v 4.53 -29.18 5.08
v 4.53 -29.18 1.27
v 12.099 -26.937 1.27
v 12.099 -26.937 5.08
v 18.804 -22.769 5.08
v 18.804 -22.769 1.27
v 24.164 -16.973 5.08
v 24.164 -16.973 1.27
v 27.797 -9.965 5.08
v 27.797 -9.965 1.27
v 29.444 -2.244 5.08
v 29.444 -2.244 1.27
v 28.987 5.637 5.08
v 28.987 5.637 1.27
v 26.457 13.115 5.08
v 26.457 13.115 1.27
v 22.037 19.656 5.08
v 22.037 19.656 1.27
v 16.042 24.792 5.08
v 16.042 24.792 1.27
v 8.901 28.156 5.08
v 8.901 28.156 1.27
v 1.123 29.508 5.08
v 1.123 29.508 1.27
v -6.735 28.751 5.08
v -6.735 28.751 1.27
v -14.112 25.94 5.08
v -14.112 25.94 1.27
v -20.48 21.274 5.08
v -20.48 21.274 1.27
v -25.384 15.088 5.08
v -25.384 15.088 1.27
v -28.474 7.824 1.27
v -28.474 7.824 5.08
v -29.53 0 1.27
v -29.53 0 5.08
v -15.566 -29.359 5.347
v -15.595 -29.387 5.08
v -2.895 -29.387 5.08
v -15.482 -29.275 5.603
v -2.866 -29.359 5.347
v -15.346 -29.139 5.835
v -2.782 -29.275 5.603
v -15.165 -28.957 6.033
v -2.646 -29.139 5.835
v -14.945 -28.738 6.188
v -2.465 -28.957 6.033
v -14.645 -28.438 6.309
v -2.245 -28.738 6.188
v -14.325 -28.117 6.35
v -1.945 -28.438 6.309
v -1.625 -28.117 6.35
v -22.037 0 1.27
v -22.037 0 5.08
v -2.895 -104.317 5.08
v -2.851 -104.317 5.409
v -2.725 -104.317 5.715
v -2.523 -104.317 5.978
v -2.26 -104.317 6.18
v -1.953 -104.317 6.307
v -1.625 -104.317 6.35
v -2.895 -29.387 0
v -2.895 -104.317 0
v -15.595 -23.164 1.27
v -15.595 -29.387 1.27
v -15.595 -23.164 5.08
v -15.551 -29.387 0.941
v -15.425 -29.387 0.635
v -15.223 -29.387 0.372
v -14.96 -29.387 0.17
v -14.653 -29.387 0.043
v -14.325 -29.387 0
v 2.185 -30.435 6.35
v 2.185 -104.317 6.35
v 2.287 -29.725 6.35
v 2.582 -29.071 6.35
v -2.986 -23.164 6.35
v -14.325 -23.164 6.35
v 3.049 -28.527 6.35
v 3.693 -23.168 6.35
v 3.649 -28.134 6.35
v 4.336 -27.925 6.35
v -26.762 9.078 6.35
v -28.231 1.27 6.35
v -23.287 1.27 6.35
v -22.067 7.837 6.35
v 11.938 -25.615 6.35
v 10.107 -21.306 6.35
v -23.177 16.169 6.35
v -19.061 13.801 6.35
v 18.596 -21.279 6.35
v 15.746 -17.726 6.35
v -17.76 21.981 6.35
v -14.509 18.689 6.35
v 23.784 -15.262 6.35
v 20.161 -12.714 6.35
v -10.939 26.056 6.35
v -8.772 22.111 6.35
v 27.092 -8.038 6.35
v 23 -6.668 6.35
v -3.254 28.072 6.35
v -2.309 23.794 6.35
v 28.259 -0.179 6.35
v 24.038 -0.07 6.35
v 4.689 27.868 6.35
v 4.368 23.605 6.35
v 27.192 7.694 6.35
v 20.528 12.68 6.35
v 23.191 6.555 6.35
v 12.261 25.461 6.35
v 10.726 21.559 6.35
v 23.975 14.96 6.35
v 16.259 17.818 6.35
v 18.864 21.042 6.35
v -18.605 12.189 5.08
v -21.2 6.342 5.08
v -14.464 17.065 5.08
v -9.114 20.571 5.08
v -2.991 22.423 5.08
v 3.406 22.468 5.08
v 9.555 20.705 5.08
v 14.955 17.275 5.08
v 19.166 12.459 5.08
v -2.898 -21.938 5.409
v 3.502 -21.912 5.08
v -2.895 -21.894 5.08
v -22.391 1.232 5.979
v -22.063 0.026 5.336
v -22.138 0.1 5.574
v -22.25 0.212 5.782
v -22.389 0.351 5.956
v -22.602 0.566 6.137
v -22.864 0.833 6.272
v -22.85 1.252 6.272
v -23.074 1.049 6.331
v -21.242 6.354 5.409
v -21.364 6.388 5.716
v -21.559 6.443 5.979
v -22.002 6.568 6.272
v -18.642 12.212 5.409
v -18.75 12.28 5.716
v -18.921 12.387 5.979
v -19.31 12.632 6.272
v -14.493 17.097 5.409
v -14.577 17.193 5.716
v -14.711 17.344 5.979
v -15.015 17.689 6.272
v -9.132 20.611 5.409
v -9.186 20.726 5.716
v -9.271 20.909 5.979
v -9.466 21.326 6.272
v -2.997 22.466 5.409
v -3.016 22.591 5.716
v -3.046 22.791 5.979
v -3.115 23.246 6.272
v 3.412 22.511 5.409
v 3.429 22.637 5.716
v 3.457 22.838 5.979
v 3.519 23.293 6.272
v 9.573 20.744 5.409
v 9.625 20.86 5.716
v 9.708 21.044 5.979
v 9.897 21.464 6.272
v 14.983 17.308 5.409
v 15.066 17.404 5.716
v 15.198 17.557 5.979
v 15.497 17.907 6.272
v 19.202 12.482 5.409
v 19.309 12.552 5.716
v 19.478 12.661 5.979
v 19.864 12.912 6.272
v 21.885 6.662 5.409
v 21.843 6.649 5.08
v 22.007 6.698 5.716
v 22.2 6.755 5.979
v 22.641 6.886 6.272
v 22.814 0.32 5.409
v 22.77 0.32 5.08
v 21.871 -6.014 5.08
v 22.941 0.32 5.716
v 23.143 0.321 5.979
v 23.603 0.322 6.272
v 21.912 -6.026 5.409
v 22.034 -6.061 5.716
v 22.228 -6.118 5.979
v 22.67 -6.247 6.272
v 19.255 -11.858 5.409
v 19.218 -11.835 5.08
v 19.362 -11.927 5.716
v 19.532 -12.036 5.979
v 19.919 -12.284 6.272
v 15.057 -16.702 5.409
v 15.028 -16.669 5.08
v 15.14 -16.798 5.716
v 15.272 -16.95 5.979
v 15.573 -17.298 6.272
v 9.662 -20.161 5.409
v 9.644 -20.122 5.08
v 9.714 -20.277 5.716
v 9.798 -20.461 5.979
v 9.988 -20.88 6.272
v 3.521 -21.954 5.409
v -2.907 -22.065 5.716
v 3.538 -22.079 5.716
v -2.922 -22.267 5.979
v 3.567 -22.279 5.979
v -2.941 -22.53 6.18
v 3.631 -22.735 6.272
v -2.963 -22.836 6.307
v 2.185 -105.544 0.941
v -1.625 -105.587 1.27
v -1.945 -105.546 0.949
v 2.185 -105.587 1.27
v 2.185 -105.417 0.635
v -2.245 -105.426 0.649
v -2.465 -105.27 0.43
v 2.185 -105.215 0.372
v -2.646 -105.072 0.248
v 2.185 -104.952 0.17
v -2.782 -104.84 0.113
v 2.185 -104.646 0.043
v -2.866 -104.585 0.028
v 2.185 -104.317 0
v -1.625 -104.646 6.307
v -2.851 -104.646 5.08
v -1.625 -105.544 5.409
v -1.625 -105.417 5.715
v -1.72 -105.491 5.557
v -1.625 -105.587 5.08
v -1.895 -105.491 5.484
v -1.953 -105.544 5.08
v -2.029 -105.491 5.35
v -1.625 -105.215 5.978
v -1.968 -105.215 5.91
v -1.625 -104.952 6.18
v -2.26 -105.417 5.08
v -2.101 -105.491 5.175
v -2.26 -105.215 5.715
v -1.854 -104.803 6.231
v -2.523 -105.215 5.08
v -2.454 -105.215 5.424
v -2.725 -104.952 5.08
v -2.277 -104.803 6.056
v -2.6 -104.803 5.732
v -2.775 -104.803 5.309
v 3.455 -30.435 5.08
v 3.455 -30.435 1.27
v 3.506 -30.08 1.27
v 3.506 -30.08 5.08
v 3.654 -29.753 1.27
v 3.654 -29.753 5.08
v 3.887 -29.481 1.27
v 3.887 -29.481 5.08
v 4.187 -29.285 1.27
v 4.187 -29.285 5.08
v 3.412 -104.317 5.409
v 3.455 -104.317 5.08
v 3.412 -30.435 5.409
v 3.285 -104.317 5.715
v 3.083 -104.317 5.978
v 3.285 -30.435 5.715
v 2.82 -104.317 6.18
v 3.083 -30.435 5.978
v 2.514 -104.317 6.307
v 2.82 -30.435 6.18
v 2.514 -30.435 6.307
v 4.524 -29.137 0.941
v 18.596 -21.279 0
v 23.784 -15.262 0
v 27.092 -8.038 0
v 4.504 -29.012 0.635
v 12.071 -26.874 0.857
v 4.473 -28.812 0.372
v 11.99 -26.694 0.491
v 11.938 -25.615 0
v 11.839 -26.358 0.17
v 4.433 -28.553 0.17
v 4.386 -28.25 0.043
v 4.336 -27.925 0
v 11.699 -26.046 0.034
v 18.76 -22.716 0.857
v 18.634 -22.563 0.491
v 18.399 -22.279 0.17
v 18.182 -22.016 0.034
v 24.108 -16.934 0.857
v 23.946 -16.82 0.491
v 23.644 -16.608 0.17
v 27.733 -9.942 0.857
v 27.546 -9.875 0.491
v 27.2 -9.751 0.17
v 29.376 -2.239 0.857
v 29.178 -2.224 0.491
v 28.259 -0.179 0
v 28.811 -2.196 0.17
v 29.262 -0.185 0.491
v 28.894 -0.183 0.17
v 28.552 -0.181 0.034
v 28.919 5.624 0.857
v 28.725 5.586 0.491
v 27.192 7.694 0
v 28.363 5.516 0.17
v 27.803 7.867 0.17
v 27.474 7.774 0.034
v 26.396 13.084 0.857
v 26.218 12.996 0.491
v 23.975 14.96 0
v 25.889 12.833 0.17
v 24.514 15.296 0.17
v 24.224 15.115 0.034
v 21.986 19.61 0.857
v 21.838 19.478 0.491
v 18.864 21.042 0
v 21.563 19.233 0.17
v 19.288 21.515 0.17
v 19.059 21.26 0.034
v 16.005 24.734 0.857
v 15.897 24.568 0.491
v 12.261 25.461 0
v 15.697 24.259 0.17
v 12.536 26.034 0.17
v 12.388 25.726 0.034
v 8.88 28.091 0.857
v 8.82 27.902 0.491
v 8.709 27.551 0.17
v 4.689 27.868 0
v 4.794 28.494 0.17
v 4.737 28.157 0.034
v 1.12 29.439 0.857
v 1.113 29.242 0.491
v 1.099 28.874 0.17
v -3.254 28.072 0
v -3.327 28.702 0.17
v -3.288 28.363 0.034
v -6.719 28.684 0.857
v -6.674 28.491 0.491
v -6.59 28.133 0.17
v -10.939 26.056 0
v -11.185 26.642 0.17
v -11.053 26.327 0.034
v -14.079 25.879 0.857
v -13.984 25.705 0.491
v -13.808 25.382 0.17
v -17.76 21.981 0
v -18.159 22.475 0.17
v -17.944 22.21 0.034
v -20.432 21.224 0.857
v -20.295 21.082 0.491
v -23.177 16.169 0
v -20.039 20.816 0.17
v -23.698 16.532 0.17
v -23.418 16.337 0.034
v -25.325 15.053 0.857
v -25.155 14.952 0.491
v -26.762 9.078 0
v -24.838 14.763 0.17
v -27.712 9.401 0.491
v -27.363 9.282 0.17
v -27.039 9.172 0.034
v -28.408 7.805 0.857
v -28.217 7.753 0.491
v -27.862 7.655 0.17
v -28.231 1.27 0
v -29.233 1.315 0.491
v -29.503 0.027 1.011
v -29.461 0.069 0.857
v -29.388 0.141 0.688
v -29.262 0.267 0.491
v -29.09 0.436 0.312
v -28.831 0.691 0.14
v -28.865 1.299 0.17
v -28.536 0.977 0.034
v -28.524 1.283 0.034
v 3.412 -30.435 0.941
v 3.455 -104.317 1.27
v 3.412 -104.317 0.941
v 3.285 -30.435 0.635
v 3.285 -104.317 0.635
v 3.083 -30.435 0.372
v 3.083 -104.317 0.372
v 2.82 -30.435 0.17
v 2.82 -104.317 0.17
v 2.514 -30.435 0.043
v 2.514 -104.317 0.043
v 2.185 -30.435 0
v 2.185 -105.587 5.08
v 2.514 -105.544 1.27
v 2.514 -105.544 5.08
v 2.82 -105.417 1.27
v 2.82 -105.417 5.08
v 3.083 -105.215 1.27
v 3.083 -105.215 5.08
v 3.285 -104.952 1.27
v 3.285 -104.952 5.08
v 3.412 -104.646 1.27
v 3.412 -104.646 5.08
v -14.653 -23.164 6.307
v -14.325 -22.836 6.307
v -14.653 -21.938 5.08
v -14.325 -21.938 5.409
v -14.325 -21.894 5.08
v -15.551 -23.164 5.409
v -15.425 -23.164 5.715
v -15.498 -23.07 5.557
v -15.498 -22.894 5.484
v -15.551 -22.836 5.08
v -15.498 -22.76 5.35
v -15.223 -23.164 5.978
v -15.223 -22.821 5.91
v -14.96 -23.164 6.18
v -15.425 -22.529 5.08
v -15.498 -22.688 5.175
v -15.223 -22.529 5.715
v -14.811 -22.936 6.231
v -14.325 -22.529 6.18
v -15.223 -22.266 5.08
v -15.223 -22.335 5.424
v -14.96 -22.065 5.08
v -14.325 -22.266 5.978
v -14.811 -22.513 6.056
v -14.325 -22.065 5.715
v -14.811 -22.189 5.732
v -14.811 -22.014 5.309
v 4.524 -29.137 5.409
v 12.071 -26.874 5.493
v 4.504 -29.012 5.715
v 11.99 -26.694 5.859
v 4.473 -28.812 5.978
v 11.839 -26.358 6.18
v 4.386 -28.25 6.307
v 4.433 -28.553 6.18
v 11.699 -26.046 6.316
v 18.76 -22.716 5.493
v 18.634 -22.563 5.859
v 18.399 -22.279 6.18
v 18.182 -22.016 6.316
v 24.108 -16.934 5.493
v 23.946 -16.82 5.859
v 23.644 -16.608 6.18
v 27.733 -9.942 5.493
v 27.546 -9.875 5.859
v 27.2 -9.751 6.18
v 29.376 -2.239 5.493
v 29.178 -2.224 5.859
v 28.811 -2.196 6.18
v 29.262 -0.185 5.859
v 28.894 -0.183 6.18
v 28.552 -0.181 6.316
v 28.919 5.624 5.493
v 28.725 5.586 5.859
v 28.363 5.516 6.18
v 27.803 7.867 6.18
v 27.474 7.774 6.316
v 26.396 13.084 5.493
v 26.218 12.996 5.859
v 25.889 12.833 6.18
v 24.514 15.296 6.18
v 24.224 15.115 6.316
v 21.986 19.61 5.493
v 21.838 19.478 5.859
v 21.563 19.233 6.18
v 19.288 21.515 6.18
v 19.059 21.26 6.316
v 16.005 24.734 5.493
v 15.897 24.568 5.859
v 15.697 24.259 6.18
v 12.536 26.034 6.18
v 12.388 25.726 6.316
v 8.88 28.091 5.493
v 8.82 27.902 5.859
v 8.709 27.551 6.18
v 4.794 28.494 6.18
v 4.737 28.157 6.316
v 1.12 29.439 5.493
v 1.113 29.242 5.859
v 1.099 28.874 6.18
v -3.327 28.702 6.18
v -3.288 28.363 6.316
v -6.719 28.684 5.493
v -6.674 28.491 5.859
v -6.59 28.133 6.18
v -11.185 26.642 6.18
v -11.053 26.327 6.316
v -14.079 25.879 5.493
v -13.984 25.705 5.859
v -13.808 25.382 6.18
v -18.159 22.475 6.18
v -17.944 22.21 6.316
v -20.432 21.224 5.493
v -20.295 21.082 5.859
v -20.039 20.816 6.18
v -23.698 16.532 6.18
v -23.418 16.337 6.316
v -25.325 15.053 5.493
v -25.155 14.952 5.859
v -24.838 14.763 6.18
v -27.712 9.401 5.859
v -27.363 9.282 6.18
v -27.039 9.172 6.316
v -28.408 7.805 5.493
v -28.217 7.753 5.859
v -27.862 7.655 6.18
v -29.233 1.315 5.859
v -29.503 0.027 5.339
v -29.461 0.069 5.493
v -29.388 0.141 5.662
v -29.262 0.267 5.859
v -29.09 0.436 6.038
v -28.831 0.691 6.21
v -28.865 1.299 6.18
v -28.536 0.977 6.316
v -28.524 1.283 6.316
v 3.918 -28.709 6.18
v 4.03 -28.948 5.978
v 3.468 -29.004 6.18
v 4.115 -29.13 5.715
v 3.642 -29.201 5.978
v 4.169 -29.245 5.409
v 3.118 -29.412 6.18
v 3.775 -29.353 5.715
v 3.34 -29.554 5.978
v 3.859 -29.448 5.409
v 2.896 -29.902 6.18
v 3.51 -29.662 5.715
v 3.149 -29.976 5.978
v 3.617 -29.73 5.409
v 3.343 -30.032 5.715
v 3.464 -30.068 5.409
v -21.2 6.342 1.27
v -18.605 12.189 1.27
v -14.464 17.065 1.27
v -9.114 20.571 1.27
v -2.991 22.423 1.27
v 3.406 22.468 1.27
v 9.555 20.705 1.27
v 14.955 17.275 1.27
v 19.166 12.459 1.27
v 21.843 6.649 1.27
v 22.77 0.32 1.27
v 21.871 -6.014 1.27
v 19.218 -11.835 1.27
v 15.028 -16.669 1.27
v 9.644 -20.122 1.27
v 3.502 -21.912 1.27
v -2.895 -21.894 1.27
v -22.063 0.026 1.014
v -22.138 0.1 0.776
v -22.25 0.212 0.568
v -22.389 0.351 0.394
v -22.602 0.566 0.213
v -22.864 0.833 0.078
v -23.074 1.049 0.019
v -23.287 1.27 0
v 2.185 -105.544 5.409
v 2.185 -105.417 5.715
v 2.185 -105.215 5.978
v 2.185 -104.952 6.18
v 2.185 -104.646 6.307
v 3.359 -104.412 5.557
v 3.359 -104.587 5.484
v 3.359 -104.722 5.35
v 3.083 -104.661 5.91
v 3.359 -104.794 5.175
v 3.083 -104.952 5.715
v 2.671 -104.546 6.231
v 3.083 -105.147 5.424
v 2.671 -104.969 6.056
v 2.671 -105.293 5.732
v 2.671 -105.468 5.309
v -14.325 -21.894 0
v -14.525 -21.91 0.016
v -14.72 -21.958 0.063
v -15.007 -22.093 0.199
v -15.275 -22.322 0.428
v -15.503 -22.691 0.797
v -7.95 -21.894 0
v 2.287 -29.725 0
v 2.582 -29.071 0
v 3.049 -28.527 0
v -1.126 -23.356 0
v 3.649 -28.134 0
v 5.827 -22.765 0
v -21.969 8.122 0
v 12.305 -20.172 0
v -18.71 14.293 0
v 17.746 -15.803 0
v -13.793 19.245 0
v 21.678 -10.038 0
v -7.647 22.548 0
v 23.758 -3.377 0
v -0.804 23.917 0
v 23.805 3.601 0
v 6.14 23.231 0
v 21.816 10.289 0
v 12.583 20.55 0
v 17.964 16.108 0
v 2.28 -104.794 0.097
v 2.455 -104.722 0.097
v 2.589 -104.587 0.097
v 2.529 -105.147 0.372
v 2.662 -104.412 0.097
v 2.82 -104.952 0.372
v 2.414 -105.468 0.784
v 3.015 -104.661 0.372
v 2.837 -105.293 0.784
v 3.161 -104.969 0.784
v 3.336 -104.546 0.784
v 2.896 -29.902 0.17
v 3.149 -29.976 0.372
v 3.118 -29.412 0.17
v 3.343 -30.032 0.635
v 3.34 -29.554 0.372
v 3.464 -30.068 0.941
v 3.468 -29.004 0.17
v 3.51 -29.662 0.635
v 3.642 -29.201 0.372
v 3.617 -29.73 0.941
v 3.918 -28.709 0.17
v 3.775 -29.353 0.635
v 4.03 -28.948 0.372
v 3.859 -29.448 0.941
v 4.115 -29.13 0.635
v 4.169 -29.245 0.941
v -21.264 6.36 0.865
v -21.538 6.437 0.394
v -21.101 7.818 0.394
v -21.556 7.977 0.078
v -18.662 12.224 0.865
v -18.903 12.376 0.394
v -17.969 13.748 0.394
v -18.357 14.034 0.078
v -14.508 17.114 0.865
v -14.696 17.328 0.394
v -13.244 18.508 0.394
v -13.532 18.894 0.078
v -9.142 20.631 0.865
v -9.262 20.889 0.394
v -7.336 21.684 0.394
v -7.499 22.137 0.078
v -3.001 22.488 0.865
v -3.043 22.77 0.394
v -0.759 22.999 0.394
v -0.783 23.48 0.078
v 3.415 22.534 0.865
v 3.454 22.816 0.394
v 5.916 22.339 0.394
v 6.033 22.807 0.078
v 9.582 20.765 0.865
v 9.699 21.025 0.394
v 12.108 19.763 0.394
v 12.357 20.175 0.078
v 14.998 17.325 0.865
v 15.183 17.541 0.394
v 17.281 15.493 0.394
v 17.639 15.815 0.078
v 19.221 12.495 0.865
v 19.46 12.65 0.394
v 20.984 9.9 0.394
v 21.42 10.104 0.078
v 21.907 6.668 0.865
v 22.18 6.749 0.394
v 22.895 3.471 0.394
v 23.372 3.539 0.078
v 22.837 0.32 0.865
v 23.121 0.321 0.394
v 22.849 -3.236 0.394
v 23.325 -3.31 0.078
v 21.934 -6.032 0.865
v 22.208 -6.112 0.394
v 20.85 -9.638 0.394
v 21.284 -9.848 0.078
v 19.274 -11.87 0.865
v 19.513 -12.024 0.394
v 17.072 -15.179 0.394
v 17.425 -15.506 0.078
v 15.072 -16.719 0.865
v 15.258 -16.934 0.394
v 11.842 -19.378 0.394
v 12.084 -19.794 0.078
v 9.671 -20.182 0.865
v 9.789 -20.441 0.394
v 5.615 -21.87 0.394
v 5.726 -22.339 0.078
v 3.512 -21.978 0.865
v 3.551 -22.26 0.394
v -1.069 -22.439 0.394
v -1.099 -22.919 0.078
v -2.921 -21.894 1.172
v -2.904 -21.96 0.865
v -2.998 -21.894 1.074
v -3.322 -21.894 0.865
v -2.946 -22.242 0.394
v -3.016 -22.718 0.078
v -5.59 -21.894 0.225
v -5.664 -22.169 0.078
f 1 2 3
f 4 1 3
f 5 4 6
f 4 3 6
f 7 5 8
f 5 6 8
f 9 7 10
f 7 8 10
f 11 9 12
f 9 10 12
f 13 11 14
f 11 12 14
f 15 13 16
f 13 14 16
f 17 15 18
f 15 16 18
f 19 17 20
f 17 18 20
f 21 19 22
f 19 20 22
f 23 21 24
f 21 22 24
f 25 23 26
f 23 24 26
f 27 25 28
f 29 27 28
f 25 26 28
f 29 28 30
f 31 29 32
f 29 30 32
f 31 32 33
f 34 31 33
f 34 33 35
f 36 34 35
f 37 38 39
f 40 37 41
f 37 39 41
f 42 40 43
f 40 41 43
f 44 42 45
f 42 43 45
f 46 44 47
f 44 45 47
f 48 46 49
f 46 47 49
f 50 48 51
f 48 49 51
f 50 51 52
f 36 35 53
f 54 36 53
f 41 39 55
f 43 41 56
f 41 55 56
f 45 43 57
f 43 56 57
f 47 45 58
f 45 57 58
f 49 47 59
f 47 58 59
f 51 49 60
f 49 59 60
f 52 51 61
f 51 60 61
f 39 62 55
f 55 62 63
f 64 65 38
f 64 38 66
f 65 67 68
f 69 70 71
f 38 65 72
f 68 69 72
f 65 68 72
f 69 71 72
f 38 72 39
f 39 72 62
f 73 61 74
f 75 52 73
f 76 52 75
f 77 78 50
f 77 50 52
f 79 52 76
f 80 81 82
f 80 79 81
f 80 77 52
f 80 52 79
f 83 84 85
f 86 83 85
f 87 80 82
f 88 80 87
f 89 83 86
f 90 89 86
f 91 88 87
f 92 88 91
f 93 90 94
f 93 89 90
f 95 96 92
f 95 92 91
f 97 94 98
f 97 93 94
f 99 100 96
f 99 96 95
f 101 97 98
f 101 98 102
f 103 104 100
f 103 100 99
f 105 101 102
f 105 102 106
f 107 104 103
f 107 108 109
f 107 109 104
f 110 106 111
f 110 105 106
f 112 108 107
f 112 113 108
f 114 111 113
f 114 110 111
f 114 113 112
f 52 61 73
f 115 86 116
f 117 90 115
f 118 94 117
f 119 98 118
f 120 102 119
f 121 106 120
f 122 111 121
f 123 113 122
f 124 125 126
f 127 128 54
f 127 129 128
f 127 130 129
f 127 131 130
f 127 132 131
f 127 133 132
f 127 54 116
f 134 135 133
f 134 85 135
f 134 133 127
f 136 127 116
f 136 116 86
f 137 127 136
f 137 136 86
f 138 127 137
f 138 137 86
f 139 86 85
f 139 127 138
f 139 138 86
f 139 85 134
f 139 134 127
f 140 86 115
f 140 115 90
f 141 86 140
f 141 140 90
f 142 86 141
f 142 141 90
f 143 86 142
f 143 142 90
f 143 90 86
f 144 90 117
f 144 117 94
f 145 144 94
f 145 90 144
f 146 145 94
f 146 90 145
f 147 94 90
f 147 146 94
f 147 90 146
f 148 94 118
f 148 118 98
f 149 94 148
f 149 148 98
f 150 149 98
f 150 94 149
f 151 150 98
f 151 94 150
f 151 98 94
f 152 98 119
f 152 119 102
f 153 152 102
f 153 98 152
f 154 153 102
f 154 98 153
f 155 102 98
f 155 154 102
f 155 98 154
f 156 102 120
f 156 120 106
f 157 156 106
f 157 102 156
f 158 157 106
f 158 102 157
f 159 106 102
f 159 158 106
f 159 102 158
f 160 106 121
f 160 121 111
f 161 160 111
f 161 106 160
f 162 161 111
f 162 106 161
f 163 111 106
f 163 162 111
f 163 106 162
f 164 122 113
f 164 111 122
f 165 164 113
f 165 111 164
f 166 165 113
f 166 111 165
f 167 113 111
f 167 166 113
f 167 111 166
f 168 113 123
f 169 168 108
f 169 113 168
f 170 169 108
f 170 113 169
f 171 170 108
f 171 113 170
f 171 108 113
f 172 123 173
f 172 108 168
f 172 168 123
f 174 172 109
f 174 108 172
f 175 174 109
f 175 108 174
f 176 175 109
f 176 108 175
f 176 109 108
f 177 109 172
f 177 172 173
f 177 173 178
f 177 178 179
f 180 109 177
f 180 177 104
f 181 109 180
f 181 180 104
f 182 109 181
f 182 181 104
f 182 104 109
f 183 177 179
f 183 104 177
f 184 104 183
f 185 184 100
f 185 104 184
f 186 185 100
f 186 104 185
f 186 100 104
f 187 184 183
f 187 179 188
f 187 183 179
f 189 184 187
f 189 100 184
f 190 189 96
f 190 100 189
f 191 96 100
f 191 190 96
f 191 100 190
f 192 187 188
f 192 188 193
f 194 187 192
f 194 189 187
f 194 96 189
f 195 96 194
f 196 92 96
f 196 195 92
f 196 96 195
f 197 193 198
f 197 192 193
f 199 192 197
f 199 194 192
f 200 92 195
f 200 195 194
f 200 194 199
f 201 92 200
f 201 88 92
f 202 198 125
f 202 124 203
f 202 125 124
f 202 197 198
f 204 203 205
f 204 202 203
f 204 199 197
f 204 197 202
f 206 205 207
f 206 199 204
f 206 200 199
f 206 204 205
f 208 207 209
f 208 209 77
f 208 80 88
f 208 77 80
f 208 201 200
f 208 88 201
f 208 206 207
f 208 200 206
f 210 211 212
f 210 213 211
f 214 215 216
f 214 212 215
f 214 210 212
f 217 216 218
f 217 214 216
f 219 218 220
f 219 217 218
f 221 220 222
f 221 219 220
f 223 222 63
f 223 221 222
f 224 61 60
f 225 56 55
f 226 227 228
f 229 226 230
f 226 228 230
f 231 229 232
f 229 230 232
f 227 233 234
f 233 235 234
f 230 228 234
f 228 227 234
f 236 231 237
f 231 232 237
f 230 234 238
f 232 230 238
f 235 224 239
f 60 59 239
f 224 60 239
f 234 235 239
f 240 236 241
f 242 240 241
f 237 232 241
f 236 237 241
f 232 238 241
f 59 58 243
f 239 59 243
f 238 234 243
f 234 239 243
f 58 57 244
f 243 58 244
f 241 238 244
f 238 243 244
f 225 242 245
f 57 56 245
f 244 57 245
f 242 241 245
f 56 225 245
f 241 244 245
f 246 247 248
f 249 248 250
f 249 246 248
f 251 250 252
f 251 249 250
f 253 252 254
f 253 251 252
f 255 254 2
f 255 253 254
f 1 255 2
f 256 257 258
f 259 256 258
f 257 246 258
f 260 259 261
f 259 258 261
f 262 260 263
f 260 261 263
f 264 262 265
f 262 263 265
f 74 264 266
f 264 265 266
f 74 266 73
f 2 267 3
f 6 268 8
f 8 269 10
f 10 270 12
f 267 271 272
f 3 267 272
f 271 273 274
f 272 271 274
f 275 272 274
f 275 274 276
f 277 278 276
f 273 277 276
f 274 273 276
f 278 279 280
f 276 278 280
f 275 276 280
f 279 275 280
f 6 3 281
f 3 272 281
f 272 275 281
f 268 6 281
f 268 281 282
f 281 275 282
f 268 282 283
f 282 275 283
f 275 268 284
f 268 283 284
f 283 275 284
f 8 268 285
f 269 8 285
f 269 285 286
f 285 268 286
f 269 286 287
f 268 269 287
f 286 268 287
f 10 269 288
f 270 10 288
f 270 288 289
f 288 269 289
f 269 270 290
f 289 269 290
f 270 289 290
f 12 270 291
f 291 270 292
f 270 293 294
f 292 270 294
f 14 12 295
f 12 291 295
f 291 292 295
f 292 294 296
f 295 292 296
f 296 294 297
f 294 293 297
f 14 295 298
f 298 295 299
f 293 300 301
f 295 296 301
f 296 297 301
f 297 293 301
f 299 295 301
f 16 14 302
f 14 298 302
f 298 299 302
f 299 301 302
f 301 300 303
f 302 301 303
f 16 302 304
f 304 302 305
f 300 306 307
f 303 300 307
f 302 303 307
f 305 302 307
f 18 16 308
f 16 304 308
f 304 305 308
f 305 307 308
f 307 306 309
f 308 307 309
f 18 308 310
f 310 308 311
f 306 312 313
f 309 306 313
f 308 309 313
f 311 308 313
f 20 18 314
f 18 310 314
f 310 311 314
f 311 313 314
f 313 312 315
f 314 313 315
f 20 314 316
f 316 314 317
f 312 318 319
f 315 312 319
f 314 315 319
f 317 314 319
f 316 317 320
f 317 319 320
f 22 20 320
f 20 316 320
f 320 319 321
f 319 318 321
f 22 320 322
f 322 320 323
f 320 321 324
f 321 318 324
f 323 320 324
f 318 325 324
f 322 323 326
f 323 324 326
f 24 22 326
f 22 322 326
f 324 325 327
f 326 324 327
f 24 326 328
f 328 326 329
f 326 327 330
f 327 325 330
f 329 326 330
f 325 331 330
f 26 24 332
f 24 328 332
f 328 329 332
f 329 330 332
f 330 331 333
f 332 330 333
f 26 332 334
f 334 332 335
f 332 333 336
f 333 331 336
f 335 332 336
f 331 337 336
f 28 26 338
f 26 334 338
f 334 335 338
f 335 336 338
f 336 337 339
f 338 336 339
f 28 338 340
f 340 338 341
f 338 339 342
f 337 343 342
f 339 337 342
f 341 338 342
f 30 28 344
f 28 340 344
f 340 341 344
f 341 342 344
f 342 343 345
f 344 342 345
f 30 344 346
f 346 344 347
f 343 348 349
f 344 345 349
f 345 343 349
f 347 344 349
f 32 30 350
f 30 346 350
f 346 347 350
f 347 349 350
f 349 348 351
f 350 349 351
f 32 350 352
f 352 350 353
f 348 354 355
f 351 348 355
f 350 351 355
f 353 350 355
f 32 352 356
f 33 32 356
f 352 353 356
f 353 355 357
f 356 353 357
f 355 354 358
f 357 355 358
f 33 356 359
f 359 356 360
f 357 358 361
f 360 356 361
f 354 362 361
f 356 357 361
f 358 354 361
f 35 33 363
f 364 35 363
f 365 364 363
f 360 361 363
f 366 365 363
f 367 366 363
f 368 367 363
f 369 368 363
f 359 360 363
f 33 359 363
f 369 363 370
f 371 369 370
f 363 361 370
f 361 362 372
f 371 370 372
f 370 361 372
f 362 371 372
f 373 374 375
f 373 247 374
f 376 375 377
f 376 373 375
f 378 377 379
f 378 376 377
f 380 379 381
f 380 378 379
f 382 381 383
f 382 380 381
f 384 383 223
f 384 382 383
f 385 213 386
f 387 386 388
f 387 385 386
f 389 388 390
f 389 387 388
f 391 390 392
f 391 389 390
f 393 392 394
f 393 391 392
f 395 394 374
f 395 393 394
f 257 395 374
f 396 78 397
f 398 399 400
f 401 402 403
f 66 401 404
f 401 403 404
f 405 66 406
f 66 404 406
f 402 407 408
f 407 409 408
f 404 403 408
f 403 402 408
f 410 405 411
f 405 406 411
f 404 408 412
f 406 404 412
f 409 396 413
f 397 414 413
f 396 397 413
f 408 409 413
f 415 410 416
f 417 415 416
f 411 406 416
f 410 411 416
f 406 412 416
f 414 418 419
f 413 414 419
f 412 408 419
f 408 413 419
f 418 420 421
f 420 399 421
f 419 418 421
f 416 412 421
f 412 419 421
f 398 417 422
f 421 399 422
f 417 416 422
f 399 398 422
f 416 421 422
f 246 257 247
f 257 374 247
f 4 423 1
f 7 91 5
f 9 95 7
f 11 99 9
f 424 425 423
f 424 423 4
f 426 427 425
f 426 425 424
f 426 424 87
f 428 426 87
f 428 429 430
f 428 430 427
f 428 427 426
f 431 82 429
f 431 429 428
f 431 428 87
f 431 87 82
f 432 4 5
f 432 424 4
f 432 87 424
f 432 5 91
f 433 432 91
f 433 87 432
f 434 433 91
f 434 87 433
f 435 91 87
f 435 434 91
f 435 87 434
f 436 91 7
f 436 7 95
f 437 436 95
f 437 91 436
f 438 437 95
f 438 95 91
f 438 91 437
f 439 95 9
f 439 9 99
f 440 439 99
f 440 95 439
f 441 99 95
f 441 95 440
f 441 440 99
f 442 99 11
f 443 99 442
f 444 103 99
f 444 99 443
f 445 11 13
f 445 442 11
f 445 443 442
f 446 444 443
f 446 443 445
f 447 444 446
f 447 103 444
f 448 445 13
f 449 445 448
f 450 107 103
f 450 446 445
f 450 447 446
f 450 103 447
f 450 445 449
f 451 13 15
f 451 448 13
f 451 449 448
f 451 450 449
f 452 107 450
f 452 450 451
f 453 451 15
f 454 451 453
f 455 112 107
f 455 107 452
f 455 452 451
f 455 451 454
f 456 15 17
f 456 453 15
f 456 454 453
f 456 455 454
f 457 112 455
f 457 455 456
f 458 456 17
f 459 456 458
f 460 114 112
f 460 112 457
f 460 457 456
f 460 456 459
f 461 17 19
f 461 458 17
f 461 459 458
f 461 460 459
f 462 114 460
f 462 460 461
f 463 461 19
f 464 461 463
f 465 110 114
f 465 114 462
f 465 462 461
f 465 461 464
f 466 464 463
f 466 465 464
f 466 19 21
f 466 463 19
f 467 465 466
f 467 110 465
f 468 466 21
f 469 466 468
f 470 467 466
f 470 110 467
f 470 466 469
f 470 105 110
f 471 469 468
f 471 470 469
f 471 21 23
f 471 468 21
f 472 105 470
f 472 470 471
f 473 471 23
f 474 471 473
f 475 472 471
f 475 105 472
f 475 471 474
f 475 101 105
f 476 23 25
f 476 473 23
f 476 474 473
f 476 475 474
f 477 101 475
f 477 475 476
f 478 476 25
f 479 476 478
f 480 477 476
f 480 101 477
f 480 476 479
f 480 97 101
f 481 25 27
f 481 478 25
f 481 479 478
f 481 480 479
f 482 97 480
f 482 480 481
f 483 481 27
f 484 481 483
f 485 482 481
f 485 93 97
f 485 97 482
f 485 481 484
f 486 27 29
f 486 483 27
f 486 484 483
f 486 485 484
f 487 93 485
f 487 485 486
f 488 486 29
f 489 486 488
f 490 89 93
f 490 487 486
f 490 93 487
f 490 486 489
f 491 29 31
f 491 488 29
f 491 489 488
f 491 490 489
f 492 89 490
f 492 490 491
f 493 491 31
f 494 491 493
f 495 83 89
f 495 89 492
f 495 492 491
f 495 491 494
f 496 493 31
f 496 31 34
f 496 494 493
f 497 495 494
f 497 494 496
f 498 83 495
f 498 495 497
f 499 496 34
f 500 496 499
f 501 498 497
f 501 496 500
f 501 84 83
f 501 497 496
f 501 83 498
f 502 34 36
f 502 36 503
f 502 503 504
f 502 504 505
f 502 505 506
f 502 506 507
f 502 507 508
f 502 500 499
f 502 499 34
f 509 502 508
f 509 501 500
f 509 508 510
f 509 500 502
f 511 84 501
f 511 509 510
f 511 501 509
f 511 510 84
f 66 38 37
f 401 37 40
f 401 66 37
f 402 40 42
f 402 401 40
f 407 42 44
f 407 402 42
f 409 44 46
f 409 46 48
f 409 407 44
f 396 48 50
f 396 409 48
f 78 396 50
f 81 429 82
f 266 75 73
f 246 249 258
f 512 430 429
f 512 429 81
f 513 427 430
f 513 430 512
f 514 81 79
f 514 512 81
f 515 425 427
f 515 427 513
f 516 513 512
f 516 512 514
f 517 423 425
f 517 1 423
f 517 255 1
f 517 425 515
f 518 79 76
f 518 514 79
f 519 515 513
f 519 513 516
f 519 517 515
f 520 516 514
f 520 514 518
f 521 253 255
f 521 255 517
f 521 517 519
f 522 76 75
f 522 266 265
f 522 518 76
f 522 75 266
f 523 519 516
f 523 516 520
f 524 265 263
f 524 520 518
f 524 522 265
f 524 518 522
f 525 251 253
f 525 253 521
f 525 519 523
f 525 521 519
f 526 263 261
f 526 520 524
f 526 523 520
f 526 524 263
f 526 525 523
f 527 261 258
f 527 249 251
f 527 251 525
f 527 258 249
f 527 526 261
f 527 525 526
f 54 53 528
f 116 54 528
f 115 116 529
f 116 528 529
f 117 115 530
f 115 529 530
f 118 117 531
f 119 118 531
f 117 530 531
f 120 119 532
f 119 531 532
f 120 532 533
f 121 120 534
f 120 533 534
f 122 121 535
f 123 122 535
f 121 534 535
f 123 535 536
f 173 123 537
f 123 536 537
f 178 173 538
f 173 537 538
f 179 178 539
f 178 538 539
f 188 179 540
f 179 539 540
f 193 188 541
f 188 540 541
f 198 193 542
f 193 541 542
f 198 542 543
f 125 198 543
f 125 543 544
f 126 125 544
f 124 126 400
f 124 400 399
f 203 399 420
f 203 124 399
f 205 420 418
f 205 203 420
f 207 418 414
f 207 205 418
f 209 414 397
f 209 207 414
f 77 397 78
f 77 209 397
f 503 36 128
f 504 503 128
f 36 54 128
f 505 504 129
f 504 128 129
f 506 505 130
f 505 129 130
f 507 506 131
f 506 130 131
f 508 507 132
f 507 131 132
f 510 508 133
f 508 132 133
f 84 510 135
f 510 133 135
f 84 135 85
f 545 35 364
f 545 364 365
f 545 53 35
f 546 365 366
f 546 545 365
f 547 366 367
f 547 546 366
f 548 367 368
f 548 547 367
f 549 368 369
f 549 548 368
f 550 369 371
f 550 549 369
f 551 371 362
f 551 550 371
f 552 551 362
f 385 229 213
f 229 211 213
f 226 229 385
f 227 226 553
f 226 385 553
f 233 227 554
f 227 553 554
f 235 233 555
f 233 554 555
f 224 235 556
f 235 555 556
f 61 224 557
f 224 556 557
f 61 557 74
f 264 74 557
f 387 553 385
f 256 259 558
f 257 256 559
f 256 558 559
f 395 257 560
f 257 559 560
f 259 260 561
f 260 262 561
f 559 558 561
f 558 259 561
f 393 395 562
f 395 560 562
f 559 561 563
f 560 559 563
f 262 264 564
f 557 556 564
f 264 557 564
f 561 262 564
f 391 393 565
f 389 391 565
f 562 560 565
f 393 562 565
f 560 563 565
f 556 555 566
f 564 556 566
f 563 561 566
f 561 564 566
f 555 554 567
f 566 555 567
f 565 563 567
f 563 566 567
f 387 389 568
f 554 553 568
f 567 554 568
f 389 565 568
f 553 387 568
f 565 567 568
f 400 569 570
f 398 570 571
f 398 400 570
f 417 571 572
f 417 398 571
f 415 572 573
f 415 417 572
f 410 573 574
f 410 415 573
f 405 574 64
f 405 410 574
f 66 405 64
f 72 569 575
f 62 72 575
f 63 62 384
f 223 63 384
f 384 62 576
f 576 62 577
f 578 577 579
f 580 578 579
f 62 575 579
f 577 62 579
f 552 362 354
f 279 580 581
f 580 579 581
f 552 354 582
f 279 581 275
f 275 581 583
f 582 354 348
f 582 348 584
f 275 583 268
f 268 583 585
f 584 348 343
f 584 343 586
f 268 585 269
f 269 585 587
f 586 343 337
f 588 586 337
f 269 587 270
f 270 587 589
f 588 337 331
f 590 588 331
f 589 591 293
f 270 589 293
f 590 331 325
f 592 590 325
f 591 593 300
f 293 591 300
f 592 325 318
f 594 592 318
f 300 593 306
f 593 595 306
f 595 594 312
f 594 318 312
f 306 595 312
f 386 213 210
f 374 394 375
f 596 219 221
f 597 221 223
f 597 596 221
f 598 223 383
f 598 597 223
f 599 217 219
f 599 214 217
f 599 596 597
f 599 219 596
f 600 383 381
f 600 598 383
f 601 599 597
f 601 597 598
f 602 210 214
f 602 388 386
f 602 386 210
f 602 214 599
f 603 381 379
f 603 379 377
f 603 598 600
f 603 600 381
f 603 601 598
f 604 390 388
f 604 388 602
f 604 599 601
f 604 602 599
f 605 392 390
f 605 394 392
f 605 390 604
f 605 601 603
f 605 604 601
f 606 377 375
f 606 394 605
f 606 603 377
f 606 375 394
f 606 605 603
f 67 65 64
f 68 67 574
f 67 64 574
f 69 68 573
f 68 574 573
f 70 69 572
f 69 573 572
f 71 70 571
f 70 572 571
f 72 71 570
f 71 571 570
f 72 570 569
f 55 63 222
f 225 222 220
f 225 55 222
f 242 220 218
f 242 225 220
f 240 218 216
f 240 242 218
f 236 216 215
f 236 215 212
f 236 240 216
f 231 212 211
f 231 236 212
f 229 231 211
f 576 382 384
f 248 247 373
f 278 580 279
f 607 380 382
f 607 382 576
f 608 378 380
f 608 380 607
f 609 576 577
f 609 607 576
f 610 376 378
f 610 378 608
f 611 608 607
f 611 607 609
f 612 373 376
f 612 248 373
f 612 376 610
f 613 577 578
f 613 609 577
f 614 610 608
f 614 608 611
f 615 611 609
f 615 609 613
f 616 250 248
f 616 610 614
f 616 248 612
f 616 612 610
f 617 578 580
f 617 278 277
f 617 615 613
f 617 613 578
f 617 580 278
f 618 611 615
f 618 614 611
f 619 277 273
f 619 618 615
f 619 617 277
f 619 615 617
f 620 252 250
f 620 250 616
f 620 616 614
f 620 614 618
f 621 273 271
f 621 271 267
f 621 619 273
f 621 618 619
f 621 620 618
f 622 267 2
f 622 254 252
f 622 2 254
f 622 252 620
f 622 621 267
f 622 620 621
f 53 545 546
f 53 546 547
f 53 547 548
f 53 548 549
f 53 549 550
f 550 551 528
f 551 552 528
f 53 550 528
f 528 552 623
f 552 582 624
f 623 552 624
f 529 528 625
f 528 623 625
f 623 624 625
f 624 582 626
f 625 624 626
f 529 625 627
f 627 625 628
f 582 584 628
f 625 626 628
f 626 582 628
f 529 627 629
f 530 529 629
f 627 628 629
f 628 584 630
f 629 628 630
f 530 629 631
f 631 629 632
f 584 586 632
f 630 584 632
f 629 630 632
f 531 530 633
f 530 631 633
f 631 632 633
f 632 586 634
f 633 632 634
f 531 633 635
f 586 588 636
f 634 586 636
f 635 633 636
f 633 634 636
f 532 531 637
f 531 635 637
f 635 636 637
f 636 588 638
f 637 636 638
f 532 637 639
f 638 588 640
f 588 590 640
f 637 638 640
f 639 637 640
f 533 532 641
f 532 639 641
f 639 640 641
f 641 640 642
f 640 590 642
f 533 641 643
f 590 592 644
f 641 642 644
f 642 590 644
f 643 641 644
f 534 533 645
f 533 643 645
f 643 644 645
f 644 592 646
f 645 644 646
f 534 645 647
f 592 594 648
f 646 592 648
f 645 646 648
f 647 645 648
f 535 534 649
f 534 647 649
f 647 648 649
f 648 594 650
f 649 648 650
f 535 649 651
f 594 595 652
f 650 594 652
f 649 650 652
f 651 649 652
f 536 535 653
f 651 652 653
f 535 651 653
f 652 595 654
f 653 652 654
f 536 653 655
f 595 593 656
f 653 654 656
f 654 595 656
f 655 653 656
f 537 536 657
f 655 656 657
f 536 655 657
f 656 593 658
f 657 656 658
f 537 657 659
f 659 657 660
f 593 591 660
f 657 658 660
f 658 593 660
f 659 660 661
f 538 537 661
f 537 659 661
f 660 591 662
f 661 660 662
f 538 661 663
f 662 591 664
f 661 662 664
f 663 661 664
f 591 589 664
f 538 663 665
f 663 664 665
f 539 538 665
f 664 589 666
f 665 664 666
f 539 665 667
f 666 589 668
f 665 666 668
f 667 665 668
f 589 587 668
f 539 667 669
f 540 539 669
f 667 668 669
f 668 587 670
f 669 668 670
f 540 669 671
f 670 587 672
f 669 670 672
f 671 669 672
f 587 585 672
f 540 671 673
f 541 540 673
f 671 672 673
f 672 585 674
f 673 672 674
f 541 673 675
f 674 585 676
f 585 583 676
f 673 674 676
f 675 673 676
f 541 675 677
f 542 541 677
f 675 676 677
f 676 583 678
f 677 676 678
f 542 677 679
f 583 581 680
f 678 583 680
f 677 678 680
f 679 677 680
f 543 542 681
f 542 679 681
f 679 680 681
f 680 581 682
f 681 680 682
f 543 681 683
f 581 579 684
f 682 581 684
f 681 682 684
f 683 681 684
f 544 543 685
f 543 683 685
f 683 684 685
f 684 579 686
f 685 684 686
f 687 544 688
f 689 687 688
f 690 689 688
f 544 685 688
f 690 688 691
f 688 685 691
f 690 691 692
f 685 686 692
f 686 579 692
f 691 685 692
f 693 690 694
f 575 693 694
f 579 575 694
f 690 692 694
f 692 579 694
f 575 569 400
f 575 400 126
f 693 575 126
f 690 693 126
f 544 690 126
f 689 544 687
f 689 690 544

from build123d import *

# Parameters (mm, degrees)
F0_W     = 12.7
F0_H     = 7.493
F1_DEPTH = 6.35
F2_R     = 1.27


# Not quite as in the source:
# - two fillets or chamfers of one size are made in one step
# - a feature names something its author has since deleted; it is built from what else it names


with BuildPart() as f1:
    # F0 (on Top) → F1 (new body)
    with BuildSketch(Plane.XY):
        with BuildLine():
            Line((-2.8947171572, -21.8944355268), (-2.8947171572, -29.3874355268))
            ThreePointArc((-2.8947171572, -29.3874355268), (0.2819172587, -29.5283131405), (3.4552828428, -29.3268098289))
            ThreePointArc((3.4552828428, -29.3268098289), (19.6210018926, 22.0684625426), (-29.5296588918, 0))
            Line((-29.5296588918, 0), (-22.0366588918, 0))
            ThreePointArc((-22.0366588918, 0), (17.2330212266, 15.017871009), (-2.8947171572, -21.8944355268))
        make_face()
        with BuildLine():
            ThreePointArc((3.4552828428, -29.3268098289), (0.2819172587, -29.5283131405), (-2.8947171572, -29.3874355268))
            Line((-2.8947171572, -29.3874355268), (-2.8947171572, -105.5874355268))
            Line((-2.8947171572, -105.5874355268), (3.4552828428, -105.5874355268))
            Line((3.4552828428, -105.5874355268), (3.4552828428, -29.3268098289))
        make_face()
        with Locations((-9.2447171572, -25.6409355268)):
            Rectangle(F0_W, F0_H)
    extrude(amount=F1_DEPTH)

    # F2
    f2_edges = [f1.edges().sort_by_distance(p)[0] for p in [
        (19.621002, 22.068463, 6.35),
        (-25.783159, 0, 6.35),
        (17.233021, 15.017871, 6.35),
        (-9.244717, -21.894436, 6.35),
        (-15.594717, -25.640936, 6.35),
        (-9.244717, -29.387436, 6.35),
        (-2.894717, -67.487436, 6.35),
        (0.280283, -105.587436, 6.35),
        (3.455283, -67.457123, 6.35),
        (-15.594717, -25.640936, 0),
        (-15.594717, -21.894436, 3.175),
        (-25.783159, 0, 0),
        (17.233021, 15.017871, 0),
        (-2.894717, -105.587436, 3.175),
        (3.455283, -105.587436, 3.175),
        (0.280283, -105.587436, 0),
        (3.455283, -29.32681, 3.175),
        (3.455283, -67.457123, 0),
        (19.621002, 22.068463, 0),
    ]]
    fillet(f2_edges, radius=F2_R)


solid = f1.part
